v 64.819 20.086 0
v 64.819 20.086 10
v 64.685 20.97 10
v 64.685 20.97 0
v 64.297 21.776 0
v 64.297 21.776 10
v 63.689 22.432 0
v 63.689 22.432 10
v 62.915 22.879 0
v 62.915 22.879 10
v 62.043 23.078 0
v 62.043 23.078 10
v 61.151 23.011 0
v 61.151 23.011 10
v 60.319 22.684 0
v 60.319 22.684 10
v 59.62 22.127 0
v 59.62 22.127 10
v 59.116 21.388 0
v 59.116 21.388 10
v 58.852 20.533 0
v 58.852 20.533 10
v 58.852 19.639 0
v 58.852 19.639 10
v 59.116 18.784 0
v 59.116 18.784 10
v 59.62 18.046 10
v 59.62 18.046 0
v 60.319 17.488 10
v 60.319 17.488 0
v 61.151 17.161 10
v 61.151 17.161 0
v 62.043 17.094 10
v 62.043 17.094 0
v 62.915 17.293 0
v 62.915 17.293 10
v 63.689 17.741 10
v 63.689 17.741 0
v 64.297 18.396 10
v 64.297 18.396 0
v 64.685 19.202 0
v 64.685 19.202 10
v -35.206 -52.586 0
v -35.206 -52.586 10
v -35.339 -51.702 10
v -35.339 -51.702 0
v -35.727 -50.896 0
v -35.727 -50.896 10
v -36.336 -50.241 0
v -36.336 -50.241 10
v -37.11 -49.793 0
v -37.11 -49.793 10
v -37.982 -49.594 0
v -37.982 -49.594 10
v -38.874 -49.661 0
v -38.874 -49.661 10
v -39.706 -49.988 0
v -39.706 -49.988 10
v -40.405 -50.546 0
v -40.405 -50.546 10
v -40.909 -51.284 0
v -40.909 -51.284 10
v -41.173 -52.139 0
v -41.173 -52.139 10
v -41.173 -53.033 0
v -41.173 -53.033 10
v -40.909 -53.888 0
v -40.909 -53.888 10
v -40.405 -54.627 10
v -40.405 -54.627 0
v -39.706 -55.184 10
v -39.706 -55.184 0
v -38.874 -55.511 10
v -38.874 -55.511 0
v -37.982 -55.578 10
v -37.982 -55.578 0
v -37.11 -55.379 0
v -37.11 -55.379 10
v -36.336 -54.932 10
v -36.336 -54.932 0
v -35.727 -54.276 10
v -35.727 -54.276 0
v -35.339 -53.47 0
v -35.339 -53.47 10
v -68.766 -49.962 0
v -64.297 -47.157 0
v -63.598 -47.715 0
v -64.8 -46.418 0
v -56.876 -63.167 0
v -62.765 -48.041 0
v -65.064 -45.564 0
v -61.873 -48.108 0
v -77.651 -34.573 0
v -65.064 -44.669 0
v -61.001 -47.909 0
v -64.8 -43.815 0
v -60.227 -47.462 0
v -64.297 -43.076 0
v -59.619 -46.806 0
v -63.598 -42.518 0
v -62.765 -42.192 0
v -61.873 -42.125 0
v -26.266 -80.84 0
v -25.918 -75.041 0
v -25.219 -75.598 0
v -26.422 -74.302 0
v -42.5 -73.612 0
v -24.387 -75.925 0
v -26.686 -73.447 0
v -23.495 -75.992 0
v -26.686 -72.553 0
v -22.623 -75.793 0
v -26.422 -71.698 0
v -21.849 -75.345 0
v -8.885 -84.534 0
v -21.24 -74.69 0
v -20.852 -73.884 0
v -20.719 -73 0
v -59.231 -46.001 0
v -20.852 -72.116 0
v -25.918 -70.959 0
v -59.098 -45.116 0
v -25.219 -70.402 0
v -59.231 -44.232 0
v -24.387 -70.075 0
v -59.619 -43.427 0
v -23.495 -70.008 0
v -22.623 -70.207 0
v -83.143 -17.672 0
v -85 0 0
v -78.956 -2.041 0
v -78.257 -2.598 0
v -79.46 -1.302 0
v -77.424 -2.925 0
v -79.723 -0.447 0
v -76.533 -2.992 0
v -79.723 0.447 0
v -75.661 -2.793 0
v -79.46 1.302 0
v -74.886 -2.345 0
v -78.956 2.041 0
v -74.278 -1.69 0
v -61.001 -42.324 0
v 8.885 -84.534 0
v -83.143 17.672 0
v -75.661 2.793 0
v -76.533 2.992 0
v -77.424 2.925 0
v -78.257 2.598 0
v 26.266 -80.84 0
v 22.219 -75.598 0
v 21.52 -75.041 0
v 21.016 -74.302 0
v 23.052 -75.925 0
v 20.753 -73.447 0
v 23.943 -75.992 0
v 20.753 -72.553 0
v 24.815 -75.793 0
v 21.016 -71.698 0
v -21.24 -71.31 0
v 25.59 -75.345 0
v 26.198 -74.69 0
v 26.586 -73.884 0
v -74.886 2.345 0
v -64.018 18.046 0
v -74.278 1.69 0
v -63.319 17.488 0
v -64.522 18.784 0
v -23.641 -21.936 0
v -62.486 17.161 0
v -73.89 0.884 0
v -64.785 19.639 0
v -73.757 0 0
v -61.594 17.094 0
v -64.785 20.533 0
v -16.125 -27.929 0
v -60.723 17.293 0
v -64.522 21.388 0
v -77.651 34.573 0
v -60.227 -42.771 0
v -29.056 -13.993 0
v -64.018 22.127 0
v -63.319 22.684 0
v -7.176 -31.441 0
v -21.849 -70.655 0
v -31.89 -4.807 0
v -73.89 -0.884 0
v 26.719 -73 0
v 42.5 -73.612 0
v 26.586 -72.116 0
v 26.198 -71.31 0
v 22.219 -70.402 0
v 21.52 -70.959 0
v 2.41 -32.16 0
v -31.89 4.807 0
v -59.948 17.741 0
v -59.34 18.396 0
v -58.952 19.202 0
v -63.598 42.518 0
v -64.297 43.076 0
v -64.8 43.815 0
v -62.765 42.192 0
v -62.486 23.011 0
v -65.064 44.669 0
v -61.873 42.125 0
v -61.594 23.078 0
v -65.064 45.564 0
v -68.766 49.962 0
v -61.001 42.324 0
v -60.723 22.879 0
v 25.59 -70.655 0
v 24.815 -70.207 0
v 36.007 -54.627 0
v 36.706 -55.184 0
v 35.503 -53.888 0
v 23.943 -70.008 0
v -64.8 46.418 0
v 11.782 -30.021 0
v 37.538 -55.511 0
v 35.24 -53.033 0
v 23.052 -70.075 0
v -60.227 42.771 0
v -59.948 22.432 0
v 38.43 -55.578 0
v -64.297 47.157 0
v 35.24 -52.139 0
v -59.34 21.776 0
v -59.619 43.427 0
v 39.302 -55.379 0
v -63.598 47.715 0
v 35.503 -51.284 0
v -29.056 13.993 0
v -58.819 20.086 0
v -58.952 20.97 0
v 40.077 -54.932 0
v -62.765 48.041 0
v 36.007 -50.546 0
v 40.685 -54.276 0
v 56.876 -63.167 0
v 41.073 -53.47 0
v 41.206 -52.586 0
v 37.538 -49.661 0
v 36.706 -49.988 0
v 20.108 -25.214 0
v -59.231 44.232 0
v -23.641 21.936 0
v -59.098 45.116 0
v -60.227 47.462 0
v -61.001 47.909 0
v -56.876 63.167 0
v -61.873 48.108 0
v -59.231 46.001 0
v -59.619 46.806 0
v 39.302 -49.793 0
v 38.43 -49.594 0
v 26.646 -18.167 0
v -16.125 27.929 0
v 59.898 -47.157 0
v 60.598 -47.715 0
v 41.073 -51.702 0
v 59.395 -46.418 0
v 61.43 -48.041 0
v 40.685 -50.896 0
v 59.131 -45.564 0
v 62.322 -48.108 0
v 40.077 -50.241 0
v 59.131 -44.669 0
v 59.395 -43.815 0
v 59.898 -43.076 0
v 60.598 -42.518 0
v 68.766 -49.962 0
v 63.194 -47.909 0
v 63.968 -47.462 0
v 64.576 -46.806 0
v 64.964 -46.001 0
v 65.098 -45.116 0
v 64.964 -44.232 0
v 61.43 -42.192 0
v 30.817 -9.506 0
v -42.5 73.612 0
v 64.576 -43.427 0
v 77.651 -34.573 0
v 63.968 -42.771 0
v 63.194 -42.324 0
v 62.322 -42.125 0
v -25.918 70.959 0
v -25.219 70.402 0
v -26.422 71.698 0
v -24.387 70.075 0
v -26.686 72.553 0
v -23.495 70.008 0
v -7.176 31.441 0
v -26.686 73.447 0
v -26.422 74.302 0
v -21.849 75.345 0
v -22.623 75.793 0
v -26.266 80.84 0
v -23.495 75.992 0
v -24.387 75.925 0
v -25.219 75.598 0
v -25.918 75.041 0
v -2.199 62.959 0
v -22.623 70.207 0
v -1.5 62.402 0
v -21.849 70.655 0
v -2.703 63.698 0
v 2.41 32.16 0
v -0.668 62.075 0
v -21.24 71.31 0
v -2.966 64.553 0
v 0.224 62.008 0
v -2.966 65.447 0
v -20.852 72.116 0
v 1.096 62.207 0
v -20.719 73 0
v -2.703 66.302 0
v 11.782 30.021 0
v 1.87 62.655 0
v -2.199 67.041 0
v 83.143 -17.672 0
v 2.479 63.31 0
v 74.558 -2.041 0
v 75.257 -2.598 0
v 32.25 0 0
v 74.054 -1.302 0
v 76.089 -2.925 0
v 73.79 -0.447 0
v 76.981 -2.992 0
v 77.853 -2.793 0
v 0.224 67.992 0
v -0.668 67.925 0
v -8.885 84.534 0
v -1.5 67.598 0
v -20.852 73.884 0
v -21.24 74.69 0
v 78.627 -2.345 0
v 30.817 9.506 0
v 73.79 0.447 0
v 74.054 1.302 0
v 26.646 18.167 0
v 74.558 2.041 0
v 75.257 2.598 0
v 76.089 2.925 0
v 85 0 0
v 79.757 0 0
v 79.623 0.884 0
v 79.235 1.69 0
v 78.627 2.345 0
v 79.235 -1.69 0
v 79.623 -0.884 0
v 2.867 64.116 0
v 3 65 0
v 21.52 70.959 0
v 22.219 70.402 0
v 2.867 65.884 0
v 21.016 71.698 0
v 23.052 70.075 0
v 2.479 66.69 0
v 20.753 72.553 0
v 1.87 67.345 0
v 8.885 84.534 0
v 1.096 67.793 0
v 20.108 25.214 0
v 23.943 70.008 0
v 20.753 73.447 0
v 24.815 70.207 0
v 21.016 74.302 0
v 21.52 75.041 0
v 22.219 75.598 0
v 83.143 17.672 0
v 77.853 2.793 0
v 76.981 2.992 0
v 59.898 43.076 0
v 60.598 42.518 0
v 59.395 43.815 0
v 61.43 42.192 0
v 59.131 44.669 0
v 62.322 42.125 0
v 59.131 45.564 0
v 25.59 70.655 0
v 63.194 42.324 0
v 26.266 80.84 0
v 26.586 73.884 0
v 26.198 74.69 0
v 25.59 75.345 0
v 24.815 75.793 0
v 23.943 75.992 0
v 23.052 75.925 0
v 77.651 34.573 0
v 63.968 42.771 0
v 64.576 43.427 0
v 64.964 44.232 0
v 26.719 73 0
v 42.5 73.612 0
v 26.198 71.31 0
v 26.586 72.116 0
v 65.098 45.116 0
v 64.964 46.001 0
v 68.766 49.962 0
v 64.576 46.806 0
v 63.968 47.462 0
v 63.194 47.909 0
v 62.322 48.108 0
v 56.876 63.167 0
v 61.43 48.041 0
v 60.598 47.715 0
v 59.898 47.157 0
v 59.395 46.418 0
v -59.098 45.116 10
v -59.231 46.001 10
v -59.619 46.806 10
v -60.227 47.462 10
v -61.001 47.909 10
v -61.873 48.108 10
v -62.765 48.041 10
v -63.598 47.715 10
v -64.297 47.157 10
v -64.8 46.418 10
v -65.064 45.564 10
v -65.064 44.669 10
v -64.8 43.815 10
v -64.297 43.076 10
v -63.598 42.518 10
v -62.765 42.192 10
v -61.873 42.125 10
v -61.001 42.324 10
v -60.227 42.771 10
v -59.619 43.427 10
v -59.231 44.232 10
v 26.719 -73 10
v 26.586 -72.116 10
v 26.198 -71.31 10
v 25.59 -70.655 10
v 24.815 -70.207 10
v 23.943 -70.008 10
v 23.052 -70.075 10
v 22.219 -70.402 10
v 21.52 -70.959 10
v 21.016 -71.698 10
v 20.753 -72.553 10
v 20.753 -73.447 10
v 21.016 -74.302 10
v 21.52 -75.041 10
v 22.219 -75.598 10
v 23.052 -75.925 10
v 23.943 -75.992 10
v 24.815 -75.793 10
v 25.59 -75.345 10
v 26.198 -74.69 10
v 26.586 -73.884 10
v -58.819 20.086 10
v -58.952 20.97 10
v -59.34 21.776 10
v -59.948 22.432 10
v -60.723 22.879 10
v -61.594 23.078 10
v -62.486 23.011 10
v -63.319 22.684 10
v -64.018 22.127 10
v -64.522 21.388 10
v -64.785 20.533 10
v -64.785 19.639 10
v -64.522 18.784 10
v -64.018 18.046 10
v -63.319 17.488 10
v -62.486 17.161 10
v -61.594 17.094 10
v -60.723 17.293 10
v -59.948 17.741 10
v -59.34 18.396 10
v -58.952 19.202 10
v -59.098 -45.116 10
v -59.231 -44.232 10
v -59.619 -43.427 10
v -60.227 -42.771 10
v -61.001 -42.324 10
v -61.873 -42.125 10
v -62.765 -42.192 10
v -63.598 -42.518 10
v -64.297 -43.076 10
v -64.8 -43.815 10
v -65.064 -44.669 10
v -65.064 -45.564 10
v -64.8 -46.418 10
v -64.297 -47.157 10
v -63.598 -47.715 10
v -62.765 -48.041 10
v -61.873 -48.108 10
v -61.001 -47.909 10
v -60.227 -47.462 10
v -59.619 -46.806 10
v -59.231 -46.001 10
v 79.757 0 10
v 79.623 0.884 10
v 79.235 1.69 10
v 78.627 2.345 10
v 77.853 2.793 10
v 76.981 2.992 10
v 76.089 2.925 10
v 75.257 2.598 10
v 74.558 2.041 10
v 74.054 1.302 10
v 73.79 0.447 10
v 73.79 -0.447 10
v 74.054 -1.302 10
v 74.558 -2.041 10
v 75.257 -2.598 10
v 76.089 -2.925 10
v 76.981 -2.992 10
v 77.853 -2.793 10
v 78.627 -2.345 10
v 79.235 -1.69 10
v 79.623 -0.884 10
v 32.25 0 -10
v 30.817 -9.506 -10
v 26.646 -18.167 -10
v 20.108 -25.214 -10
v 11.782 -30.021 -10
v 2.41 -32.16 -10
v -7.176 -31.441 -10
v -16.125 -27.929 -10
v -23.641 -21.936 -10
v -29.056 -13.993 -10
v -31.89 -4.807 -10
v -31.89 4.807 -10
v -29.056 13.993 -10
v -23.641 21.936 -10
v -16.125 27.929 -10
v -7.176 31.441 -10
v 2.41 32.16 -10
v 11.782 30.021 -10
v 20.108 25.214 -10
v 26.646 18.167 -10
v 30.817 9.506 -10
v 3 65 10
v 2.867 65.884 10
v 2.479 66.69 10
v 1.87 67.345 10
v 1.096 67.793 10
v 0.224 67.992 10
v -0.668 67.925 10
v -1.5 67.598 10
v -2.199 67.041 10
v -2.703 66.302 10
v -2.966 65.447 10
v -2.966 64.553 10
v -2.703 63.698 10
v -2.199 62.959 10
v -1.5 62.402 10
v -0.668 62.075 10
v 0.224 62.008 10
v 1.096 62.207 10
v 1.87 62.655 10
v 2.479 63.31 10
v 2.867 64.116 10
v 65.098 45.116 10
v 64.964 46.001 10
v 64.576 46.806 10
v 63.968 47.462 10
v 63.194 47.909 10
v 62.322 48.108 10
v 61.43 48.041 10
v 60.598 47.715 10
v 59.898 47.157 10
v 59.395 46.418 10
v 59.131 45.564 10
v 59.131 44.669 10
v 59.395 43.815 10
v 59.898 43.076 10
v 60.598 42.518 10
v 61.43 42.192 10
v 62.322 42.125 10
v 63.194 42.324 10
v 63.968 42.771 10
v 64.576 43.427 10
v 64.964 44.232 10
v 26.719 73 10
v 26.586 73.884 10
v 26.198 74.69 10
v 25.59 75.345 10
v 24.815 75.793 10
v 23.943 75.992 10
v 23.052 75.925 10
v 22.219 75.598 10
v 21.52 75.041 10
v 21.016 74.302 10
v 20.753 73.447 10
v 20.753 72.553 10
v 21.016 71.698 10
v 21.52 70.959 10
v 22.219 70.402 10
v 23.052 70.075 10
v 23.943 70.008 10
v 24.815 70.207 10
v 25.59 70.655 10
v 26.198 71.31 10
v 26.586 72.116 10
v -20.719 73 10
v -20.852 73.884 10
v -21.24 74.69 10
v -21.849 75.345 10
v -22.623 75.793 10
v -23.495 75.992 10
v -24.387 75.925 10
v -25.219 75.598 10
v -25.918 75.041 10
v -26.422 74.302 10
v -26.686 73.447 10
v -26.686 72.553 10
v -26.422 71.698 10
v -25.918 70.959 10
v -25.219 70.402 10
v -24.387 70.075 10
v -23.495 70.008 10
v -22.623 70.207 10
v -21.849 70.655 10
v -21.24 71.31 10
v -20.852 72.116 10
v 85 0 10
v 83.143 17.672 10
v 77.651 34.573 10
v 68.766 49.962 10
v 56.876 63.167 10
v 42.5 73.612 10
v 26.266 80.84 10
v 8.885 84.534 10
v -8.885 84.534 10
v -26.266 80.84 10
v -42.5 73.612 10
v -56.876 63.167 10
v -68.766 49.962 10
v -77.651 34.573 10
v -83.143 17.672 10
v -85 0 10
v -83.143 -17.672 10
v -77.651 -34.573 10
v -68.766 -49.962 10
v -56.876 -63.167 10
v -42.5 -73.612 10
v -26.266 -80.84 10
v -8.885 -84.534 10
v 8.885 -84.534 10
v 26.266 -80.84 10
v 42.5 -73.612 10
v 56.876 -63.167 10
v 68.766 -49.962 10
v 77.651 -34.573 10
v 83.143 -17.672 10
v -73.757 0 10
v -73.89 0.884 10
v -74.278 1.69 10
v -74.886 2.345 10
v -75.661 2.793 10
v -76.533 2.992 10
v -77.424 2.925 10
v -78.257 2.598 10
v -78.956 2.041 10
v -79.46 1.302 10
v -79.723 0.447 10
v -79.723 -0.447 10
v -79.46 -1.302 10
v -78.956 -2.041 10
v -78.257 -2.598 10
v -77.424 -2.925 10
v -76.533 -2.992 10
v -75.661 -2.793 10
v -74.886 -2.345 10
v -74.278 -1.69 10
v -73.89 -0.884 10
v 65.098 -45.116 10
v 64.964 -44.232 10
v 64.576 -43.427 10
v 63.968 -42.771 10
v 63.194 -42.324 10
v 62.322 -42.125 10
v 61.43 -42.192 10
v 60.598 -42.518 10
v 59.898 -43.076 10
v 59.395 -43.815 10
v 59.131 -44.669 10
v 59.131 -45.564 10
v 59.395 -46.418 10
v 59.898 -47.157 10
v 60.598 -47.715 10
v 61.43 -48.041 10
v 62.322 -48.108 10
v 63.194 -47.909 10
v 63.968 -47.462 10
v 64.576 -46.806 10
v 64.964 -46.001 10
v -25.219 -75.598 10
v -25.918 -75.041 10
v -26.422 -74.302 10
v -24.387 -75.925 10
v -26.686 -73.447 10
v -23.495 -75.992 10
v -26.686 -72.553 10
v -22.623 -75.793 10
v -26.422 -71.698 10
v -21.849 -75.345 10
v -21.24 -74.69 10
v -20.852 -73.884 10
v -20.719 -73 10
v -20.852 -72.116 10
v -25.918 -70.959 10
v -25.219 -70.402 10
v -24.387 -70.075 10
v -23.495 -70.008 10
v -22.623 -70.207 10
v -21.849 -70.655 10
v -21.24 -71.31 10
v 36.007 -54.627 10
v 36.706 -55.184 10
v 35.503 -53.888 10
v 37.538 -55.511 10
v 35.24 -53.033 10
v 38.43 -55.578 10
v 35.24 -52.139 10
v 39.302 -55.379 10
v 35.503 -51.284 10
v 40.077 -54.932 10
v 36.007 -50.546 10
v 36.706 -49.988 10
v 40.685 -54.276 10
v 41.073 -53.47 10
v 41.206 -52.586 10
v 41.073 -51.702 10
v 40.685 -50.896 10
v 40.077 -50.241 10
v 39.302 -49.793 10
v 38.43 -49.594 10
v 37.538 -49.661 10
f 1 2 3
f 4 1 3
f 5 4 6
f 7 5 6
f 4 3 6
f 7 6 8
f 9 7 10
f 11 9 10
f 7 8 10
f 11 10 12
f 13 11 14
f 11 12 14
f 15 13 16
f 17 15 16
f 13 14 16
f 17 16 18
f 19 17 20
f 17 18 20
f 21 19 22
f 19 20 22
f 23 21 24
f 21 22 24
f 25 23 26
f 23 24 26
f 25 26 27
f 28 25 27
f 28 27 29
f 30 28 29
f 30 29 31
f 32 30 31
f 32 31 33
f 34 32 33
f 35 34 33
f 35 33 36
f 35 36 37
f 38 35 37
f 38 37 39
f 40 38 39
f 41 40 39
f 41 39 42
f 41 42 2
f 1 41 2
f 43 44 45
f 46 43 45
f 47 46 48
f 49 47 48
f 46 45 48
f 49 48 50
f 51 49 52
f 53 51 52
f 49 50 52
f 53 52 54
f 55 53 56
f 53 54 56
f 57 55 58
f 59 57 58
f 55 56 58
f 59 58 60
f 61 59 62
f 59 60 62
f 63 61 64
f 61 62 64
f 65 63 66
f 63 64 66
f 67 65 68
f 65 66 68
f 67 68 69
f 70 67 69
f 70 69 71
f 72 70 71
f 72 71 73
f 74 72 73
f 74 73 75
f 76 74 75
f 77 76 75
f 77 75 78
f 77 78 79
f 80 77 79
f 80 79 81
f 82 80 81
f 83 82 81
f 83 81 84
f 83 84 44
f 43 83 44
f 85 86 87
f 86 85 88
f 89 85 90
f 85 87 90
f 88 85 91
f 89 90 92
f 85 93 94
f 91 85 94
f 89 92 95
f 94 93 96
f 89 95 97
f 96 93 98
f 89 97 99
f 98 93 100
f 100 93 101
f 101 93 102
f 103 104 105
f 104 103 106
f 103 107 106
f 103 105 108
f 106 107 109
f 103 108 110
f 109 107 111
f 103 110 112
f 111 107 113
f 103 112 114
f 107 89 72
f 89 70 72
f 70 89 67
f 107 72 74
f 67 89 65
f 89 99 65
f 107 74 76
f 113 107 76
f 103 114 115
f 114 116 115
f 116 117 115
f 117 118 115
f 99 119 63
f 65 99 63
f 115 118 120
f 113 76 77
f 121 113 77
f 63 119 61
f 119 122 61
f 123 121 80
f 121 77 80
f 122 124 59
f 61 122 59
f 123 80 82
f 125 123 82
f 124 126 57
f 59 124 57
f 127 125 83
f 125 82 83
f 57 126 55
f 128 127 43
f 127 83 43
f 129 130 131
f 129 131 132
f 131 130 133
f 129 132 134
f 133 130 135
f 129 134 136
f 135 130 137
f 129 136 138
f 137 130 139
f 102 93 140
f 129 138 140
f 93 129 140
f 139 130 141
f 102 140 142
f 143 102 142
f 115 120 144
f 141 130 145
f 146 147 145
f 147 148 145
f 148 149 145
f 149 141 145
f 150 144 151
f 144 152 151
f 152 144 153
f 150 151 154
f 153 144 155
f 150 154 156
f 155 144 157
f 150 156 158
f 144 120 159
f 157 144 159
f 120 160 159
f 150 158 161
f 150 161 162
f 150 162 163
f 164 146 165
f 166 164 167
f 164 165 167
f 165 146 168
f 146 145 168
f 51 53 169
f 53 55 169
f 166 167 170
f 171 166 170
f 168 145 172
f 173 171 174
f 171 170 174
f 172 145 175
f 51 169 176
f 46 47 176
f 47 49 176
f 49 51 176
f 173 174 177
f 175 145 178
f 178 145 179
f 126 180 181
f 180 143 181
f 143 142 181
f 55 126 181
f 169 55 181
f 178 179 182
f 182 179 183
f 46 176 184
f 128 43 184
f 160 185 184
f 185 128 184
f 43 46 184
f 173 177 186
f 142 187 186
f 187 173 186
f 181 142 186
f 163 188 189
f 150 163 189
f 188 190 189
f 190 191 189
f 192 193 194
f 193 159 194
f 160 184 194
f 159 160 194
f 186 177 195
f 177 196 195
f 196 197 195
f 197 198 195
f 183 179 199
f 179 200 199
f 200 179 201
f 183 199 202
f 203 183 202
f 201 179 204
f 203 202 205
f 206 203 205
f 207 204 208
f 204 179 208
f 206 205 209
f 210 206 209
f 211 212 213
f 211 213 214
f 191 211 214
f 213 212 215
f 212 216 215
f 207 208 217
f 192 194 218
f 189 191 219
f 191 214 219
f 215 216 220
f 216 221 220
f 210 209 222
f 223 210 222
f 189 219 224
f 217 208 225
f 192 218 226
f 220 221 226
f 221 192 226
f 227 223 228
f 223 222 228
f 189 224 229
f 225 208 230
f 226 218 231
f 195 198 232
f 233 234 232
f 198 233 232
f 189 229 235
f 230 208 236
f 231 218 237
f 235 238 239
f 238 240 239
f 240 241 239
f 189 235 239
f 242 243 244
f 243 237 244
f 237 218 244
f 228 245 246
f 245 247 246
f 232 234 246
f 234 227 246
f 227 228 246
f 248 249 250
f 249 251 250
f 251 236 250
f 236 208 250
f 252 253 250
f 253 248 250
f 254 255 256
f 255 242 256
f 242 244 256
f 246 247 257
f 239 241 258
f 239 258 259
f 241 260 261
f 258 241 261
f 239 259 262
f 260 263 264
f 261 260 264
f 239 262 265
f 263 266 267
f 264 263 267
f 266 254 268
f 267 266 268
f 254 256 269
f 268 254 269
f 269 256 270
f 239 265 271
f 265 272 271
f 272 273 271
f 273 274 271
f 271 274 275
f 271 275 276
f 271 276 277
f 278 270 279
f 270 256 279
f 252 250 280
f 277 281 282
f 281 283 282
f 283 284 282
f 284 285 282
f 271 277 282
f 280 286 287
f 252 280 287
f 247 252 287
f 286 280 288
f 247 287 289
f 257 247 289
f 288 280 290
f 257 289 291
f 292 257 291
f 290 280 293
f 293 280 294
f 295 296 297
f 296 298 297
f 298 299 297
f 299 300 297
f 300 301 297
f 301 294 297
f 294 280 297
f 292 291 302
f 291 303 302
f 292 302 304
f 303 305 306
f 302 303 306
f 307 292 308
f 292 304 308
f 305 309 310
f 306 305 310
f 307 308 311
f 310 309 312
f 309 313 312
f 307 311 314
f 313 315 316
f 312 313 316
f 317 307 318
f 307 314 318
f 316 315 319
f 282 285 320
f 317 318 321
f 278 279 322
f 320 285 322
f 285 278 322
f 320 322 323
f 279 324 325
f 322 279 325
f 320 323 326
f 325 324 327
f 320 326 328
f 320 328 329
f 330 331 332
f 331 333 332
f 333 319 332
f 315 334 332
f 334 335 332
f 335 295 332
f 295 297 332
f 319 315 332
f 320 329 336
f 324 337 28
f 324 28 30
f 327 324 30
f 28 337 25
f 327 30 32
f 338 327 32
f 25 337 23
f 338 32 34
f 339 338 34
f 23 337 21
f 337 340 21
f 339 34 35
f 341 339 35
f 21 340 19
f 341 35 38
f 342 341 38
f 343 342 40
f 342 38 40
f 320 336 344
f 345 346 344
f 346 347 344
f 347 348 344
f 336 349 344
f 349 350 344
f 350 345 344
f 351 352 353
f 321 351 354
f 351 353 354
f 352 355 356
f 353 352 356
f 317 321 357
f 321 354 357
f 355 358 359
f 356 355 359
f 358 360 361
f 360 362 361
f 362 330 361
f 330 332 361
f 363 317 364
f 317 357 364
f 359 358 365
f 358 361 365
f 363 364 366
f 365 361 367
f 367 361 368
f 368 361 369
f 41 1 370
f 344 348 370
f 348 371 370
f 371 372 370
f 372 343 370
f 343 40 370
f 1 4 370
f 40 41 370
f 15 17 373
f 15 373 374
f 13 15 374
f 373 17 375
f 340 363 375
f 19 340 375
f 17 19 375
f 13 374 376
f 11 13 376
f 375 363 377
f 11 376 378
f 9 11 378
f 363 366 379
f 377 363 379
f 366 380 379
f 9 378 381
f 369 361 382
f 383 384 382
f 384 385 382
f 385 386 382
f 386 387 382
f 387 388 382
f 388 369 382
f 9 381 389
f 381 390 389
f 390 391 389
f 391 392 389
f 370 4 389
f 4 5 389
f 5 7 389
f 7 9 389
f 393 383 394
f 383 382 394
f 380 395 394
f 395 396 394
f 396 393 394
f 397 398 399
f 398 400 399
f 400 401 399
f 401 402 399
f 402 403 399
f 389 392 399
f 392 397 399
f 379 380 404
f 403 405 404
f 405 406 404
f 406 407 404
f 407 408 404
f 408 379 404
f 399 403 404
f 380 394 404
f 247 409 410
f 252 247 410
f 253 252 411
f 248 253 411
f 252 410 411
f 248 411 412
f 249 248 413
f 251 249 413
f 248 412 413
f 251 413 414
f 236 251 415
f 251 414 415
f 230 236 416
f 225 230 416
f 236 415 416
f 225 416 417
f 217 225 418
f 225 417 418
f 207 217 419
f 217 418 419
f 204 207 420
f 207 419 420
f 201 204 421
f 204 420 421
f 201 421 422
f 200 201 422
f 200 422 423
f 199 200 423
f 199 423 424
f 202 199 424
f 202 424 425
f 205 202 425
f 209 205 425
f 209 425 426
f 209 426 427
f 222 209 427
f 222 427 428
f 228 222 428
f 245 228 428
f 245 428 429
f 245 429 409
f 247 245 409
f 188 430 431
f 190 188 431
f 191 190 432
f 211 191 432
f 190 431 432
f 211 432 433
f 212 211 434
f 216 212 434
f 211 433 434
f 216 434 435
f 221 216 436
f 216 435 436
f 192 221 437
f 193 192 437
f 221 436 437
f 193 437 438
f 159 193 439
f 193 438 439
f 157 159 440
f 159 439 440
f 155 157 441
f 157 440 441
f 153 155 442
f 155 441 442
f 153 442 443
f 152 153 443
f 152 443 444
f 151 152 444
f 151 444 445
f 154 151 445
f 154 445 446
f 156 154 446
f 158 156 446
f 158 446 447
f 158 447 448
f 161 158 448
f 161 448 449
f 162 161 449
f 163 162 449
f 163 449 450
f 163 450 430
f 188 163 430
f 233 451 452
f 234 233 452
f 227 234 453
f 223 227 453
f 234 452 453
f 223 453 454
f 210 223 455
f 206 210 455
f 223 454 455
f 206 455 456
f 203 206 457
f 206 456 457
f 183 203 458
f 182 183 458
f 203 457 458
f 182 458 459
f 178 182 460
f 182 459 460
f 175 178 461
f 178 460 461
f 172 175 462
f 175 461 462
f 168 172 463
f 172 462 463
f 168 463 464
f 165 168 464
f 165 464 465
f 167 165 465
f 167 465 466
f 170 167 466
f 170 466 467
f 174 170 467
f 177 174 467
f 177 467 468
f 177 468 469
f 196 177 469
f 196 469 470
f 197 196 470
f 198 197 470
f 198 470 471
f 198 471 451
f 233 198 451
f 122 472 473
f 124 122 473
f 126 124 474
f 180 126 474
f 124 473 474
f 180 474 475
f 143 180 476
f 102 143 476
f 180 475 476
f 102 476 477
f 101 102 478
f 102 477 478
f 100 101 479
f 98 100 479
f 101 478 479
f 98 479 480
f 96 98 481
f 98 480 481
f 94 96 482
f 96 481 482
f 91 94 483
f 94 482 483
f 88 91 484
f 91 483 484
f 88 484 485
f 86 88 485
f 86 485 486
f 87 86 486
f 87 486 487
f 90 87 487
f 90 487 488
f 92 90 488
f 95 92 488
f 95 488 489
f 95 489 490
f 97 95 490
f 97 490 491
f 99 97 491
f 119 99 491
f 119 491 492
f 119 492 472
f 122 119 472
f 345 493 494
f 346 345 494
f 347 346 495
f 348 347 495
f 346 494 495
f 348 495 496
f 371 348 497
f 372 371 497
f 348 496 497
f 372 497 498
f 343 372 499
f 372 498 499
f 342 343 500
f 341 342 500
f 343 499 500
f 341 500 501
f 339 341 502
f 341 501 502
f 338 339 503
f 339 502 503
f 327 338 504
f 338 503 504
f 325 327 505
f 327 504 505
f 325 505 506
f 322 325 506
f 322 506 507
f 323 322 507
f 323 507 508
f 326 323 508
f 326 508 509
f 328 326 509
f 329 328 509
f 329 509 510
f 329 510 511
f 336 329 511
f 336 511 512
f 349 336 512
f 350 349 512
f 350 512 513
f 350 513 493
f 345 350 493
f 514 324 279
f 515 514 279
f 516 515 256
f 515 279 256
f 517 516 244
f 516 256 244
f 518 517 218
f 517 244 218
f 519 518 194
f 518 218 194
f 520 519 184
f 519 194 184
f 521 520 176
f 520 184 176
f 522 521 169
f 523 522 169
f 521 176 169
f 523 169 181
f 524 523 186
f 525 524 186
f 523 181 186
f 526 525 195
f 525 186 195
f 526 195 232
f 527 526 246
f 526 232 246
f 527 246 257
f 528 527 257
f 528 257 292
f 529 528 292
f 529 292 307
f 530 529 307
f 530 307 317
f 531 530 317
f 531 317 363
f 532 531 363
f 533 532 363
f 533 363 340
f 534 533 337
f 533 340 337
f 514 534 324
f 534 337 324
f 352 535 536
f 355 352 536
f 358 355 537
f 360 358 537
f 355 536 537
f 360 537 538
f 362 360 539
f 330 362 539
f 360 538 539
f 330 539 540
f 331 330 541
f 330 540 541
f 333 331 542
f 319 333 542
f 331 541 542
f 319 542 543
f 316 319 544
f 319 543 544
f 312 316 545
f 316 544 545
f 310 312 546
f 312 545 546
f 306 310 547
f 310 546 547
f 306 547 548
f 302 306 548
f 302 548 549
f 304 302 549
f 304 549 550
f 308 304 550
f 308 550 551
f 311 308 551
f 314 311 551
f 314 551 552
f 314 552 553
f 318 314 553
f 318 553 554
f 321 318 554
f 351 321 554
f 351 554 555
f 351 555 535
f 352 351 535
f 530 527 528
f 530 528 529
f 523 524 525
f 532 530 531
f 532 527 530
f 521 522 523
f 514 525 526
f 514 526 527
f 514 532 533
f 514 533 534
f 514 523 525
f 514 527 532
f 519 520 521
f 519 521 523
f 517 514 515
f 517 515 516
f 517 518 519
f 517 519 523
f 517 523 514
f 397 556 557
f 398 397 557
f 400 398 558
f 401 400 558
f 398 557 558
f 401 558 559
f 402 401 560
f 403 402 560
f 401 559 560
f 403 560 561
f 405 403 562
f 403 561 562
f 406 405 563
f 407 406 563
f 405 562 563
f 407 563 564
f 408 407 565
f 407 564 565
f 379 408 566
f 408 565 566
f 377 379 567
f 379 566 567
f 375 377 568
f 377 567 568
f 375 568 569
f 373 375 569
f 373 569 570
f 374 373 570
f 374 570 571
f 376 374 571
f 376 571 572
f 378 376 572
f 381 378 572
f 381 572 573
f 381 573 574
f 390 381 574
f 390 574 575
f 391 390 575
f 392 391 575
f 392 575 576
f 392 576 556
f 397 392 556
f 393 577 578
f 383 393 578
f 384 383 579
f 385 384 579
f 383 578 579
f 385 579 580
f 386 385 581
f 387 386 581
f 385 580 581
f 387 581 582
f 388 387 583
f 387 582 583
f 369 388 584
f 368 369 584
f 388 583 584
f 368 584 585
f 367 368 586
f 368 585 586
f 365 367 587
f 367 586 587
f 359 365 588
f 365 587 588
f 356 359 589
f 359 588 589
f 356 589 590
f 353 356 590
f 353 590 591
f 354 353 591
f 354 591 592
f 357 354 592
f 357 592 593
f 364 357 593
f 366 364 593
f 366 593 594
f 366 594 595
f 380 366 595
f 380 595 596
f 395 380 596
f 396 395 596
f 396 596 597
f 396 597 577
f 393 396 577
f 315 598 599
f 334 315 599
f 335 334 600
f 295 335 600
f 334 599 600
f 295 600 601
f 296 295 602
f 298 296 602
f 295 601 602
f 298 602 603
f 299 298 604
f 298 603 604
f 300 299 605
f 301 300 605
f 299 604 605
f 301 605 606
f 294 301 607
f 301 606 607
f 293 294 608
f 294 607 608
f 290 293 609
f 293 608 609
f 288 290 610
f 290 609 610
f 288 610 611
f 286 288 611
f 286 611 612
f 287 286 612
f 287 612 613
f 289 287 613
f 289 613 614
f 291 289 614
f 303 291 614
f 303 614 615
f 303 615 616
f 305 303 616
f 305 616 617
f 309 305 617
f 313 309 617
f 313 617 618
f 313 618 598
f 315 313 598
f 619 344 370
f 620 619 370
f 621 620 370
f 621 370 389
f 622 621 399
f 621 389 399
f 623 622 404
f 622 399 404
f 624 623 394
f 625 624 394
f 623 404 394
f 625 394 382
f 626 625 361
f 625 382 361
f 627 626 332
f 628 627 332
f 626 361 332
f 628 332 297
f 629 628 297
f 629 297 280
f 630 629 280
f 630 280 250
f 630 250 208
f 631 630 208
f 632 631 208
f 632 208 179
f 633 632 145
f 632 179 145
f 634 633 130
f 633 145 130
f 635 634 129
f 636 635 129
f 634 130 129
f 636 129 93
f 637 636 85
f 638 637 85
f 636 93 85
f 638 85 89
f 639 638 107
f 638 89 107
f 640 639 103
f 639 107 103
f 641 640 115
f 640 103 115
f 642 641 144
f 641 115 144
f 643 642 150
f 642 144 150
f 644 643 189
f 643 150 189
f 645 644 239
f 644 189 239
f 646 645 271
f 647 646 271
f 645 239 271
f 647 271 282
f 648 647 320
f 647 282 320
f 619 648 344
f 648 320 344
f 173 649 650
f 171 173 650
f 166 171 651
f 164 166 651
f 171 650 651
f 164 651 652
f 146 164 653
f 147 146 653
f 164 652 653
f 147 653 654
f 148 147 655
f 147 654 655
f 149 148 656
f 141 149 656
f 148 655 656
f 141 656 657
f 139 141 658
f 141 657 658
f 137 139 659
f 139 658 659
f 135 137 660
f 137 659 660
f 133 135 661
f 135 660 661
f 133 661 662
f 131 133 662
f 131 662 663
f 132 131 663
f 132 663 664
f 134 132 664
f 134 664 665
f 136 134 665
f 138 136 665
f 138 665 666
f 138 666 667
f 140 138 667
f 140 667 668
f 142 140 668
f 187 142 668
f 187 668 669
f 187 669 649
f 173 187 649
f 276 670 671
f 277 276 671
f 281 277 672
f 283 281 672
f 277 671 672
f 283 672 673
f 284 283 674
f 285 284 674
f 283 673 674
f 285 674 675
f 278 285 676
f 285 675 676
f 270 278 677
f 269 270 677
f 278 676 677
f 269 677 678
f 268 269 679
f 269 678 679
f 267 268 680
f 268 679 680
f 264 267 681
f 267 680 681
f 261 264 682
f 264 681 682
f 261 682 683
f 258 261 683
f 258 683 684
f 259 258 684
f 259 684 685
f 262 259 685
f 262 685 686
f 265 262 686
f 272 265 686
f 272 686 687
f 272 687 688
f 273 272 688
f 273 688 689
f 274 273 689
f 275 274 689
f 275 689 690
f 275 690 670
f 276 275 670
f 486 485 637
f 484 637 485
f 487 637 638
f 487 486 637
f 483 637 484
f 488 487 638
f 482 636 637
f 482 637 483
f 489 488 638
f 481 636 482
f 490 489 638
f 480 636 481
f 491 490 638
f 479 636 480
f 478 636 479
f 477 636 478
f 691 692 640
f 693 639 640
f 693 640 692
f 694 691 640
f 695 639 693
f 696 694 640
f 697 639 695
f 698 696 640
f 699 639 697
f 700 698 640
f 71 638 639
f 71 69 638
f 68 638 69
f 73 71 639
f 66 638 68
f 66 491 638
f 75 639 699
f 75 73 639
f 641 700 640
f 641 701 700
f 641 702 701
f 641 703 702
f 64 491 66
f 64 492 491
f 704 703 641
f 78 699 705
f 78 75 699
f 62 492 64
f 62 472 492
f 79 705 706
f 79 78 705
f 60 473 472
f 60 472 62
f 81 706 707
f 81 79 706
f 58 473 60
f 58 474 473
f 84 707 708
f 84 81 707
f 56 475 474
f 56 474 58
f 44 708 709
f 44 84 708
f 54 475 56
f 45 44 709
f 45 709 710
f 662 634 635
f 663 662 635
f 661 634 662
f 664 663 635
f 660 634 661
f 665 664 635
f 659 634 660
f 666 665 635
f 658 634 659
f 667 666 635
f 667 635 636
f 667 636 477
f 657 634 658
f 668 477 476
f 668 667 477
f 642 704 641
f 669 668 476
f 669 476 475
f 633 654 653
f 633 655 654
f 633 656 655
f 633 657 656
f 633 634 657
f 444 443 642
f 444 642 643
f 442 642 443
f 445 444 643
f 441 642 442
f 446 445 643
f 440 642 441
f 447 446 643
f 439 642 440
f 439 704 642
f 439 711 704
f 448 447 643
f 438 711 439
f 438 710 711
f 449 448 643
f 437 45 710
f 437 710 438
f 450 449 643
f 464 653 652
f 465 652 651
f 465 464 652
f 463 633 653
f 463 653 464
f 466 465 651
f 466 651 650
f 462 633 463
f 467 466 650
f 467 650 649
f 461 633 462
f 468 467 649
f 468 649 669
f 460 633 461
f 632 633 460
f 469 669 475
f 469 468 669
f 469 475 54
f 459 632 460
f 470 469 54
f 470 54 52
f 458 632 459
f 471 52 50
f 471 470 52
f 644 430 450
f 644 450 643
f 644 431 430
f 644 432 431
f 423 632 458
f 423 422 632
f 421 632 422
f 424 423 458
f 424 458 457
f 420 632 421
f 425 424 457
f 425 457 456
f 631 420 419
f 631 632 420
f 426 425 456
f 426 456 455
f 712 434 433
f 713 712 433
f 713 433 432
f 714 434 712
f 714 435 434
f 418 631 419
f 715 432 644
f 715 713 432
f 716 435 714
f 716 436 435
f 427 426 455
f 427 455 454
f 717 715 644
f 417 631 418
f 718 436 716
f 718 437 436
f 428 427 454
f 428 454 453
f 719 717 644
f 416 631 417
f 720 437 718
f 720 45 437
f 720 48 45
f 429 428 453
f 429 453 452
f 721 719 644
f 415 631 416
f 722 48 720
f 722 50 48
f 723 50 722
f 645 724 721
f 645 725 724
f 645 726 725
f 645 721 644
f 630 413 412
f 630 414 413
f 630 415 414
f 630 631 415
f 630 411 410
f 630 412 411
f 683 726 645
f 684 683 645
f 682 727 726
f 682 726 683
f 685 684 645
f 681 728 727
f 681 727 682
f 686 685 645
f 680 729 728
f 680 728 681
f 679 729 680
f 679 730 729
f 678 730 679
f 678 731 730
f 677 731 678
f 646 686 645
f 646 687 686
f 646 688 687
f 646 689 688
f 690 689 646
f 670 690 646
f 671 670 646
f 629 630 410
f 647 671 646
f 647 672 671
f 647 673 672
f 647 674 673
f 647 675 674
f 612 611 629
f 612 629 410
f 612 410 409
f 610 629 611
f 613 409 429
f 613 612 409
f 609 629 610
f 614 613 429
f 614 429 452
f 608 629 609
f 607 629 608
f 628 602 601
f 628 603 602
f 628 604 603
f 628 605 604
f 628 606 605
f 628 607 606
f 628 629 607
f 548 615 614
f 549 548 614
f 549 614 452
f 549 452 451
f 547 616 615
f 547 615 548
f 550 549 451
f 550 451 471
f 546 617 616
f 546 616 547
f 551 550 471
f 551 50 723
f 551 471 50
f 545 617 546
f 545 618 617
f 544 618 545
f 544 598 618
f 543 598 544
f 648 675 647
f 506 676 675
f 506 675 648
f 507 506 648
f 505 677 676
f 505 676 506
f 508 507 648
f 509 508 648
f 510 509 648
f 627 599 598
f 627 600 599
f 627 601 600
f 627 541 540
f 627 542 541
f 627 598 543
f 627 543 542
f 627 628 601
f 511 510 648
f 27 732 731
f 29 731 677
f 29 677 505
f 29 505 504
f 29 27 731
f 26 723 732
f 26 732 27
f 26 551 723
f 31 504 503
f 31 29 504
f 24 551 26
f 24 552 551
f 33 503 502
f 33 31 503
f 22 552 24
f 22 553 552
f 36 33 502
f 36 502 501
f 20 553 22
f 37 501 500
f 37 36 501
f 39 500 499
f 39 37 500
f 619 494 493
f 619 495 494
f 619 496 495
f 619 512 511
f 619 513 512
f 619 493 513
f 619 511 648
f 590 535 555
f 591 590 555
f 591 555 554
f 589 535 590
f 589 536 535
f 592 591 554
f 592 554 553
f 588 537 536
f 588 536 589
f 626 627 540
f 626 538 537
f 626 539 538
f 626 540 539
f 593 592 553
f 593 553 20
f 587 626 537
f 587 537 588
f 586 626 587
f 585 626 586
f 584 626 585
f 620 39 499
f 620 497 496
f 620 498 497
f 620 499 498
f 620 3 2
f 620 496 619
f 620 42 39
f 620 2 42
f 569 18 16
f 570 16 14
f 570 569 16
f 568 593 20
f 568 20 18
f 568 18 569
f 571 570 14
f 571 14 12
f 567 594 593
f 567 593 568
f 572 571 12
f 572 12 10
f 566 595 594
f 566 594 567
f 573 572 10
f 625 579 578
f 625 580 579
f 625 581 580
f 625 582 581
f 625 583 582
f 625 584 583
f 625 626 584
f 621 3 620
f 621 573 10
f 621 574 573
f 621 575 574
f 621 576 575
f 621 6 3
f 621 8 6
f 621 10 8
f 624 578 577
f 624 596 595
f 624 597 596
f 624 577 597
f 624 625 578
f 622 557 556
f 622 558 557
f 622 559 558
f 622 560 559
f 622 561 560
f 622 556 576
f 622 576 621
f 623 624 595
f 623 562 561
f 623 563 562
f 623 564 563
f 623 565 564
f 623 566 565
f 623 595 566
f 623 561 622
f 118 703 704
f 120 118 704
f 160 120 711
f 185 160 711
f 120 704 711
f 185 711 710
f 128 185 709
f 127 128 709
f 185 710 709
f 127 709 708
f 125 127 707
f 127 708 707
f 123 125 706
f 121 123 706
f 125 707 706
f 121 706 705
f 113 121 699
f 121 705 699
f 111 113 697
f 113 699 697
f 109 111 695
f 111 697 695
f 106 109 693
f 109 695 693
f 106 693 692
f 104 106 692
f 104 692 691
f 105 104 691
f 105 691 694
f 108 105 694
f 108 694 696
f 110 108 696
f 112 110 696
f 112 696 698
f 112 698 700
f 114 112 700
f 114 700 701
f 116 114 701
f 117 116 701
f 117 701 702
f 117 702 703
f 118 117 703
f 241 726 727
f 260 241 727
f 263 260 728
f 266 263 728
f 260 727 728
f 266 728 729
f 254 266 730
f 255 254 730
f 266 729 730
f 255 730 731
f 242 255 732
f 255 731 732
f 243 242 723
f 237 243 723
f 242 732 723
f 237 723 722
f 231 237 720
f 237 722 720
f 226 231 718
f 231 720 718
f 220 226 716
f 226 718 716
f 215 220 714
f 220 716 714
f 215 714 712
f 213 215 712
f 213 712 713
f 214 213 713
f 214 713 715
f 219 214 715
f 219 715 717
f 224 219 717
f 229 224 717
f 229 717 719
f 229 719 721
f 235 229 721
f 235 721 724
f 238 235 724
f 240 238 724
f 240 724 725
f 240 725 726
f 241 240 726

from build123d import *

# Parameters (mm, degrees)
F0_R     = 85
F1_DEPTH = 10
F2_R     = 32.25
F3_DEPTH = 10
F4_R     = 3
F5_DEPTH = 20.001
F6_R     = 3
F7_DEPTH = 20.001


with BuildPart() as f1:
    # F0 (on Top) → F1 (new body)
    with BuildSketch(Plane.XY):
        Circle(F0_R)
    extrude(amount=F1_DEPTH)

    # F2 (on face) → F3 (join)
    with BuildSketch(Plane(origin=(0, 0, 0), x_dir=(1, 0, 0), z_dir=(0, 0, -1))):
        Circle(F2_R)
    extrude(amount=F3_DEPTH)

    # F4 (on face) → F5 (cut, through all)
    with BuildSketch(Plane.XY.offset(10)):
        with Locations((0, 65)):
            Circle(F4_R)
        with Locations((-61.818674, 20.086105)):
            Circle(F4_R)
        with Locations((-38.206041, -52.586105)):
            Circle(F4_R)
        with Locations((38.206041, -52.586105)):
            Circle(F4_R)
        with Locations((61.818674, 20.086105)):
            Circle(F4_R)
    extrude(amount=-F5_DEPTH, mode=Mode.SUBTRACT)

    # F6 (on face) → F7 (cut, through all)
    with BuildSketch(Plane.XY.offset(10)):
        with Locations((-23.719138, -73)):
            Circle(F6_R)
        with Locations((23.719138, -73)):
            Circle(F6_R)
        with Locations((62.097509, -45.116481)):
            Circle(F6_R)
        with Locations((76.756742, 0)):
            Circle(F6_R)
        with Locations((62.097509, 45.116481)):
            Circle(F6_R)
        with Locations((23.719138, 73)):
            Circle(F6_R)
        with Locations((-23.719138, 73)):
            Circle(F6_R)
        with Locations((-62.097509, 45.116481)):
            Circle(F6_R)
        with Locations((-76.756742, 0)):
            Circle(F6_R)
        with Locations((-62.097509, -45.116481)):
            Circle(F6_R)
    extrude(amount=-F7_DEPTH, mode=Mode.SUBTRACT)


solid = f1.part
